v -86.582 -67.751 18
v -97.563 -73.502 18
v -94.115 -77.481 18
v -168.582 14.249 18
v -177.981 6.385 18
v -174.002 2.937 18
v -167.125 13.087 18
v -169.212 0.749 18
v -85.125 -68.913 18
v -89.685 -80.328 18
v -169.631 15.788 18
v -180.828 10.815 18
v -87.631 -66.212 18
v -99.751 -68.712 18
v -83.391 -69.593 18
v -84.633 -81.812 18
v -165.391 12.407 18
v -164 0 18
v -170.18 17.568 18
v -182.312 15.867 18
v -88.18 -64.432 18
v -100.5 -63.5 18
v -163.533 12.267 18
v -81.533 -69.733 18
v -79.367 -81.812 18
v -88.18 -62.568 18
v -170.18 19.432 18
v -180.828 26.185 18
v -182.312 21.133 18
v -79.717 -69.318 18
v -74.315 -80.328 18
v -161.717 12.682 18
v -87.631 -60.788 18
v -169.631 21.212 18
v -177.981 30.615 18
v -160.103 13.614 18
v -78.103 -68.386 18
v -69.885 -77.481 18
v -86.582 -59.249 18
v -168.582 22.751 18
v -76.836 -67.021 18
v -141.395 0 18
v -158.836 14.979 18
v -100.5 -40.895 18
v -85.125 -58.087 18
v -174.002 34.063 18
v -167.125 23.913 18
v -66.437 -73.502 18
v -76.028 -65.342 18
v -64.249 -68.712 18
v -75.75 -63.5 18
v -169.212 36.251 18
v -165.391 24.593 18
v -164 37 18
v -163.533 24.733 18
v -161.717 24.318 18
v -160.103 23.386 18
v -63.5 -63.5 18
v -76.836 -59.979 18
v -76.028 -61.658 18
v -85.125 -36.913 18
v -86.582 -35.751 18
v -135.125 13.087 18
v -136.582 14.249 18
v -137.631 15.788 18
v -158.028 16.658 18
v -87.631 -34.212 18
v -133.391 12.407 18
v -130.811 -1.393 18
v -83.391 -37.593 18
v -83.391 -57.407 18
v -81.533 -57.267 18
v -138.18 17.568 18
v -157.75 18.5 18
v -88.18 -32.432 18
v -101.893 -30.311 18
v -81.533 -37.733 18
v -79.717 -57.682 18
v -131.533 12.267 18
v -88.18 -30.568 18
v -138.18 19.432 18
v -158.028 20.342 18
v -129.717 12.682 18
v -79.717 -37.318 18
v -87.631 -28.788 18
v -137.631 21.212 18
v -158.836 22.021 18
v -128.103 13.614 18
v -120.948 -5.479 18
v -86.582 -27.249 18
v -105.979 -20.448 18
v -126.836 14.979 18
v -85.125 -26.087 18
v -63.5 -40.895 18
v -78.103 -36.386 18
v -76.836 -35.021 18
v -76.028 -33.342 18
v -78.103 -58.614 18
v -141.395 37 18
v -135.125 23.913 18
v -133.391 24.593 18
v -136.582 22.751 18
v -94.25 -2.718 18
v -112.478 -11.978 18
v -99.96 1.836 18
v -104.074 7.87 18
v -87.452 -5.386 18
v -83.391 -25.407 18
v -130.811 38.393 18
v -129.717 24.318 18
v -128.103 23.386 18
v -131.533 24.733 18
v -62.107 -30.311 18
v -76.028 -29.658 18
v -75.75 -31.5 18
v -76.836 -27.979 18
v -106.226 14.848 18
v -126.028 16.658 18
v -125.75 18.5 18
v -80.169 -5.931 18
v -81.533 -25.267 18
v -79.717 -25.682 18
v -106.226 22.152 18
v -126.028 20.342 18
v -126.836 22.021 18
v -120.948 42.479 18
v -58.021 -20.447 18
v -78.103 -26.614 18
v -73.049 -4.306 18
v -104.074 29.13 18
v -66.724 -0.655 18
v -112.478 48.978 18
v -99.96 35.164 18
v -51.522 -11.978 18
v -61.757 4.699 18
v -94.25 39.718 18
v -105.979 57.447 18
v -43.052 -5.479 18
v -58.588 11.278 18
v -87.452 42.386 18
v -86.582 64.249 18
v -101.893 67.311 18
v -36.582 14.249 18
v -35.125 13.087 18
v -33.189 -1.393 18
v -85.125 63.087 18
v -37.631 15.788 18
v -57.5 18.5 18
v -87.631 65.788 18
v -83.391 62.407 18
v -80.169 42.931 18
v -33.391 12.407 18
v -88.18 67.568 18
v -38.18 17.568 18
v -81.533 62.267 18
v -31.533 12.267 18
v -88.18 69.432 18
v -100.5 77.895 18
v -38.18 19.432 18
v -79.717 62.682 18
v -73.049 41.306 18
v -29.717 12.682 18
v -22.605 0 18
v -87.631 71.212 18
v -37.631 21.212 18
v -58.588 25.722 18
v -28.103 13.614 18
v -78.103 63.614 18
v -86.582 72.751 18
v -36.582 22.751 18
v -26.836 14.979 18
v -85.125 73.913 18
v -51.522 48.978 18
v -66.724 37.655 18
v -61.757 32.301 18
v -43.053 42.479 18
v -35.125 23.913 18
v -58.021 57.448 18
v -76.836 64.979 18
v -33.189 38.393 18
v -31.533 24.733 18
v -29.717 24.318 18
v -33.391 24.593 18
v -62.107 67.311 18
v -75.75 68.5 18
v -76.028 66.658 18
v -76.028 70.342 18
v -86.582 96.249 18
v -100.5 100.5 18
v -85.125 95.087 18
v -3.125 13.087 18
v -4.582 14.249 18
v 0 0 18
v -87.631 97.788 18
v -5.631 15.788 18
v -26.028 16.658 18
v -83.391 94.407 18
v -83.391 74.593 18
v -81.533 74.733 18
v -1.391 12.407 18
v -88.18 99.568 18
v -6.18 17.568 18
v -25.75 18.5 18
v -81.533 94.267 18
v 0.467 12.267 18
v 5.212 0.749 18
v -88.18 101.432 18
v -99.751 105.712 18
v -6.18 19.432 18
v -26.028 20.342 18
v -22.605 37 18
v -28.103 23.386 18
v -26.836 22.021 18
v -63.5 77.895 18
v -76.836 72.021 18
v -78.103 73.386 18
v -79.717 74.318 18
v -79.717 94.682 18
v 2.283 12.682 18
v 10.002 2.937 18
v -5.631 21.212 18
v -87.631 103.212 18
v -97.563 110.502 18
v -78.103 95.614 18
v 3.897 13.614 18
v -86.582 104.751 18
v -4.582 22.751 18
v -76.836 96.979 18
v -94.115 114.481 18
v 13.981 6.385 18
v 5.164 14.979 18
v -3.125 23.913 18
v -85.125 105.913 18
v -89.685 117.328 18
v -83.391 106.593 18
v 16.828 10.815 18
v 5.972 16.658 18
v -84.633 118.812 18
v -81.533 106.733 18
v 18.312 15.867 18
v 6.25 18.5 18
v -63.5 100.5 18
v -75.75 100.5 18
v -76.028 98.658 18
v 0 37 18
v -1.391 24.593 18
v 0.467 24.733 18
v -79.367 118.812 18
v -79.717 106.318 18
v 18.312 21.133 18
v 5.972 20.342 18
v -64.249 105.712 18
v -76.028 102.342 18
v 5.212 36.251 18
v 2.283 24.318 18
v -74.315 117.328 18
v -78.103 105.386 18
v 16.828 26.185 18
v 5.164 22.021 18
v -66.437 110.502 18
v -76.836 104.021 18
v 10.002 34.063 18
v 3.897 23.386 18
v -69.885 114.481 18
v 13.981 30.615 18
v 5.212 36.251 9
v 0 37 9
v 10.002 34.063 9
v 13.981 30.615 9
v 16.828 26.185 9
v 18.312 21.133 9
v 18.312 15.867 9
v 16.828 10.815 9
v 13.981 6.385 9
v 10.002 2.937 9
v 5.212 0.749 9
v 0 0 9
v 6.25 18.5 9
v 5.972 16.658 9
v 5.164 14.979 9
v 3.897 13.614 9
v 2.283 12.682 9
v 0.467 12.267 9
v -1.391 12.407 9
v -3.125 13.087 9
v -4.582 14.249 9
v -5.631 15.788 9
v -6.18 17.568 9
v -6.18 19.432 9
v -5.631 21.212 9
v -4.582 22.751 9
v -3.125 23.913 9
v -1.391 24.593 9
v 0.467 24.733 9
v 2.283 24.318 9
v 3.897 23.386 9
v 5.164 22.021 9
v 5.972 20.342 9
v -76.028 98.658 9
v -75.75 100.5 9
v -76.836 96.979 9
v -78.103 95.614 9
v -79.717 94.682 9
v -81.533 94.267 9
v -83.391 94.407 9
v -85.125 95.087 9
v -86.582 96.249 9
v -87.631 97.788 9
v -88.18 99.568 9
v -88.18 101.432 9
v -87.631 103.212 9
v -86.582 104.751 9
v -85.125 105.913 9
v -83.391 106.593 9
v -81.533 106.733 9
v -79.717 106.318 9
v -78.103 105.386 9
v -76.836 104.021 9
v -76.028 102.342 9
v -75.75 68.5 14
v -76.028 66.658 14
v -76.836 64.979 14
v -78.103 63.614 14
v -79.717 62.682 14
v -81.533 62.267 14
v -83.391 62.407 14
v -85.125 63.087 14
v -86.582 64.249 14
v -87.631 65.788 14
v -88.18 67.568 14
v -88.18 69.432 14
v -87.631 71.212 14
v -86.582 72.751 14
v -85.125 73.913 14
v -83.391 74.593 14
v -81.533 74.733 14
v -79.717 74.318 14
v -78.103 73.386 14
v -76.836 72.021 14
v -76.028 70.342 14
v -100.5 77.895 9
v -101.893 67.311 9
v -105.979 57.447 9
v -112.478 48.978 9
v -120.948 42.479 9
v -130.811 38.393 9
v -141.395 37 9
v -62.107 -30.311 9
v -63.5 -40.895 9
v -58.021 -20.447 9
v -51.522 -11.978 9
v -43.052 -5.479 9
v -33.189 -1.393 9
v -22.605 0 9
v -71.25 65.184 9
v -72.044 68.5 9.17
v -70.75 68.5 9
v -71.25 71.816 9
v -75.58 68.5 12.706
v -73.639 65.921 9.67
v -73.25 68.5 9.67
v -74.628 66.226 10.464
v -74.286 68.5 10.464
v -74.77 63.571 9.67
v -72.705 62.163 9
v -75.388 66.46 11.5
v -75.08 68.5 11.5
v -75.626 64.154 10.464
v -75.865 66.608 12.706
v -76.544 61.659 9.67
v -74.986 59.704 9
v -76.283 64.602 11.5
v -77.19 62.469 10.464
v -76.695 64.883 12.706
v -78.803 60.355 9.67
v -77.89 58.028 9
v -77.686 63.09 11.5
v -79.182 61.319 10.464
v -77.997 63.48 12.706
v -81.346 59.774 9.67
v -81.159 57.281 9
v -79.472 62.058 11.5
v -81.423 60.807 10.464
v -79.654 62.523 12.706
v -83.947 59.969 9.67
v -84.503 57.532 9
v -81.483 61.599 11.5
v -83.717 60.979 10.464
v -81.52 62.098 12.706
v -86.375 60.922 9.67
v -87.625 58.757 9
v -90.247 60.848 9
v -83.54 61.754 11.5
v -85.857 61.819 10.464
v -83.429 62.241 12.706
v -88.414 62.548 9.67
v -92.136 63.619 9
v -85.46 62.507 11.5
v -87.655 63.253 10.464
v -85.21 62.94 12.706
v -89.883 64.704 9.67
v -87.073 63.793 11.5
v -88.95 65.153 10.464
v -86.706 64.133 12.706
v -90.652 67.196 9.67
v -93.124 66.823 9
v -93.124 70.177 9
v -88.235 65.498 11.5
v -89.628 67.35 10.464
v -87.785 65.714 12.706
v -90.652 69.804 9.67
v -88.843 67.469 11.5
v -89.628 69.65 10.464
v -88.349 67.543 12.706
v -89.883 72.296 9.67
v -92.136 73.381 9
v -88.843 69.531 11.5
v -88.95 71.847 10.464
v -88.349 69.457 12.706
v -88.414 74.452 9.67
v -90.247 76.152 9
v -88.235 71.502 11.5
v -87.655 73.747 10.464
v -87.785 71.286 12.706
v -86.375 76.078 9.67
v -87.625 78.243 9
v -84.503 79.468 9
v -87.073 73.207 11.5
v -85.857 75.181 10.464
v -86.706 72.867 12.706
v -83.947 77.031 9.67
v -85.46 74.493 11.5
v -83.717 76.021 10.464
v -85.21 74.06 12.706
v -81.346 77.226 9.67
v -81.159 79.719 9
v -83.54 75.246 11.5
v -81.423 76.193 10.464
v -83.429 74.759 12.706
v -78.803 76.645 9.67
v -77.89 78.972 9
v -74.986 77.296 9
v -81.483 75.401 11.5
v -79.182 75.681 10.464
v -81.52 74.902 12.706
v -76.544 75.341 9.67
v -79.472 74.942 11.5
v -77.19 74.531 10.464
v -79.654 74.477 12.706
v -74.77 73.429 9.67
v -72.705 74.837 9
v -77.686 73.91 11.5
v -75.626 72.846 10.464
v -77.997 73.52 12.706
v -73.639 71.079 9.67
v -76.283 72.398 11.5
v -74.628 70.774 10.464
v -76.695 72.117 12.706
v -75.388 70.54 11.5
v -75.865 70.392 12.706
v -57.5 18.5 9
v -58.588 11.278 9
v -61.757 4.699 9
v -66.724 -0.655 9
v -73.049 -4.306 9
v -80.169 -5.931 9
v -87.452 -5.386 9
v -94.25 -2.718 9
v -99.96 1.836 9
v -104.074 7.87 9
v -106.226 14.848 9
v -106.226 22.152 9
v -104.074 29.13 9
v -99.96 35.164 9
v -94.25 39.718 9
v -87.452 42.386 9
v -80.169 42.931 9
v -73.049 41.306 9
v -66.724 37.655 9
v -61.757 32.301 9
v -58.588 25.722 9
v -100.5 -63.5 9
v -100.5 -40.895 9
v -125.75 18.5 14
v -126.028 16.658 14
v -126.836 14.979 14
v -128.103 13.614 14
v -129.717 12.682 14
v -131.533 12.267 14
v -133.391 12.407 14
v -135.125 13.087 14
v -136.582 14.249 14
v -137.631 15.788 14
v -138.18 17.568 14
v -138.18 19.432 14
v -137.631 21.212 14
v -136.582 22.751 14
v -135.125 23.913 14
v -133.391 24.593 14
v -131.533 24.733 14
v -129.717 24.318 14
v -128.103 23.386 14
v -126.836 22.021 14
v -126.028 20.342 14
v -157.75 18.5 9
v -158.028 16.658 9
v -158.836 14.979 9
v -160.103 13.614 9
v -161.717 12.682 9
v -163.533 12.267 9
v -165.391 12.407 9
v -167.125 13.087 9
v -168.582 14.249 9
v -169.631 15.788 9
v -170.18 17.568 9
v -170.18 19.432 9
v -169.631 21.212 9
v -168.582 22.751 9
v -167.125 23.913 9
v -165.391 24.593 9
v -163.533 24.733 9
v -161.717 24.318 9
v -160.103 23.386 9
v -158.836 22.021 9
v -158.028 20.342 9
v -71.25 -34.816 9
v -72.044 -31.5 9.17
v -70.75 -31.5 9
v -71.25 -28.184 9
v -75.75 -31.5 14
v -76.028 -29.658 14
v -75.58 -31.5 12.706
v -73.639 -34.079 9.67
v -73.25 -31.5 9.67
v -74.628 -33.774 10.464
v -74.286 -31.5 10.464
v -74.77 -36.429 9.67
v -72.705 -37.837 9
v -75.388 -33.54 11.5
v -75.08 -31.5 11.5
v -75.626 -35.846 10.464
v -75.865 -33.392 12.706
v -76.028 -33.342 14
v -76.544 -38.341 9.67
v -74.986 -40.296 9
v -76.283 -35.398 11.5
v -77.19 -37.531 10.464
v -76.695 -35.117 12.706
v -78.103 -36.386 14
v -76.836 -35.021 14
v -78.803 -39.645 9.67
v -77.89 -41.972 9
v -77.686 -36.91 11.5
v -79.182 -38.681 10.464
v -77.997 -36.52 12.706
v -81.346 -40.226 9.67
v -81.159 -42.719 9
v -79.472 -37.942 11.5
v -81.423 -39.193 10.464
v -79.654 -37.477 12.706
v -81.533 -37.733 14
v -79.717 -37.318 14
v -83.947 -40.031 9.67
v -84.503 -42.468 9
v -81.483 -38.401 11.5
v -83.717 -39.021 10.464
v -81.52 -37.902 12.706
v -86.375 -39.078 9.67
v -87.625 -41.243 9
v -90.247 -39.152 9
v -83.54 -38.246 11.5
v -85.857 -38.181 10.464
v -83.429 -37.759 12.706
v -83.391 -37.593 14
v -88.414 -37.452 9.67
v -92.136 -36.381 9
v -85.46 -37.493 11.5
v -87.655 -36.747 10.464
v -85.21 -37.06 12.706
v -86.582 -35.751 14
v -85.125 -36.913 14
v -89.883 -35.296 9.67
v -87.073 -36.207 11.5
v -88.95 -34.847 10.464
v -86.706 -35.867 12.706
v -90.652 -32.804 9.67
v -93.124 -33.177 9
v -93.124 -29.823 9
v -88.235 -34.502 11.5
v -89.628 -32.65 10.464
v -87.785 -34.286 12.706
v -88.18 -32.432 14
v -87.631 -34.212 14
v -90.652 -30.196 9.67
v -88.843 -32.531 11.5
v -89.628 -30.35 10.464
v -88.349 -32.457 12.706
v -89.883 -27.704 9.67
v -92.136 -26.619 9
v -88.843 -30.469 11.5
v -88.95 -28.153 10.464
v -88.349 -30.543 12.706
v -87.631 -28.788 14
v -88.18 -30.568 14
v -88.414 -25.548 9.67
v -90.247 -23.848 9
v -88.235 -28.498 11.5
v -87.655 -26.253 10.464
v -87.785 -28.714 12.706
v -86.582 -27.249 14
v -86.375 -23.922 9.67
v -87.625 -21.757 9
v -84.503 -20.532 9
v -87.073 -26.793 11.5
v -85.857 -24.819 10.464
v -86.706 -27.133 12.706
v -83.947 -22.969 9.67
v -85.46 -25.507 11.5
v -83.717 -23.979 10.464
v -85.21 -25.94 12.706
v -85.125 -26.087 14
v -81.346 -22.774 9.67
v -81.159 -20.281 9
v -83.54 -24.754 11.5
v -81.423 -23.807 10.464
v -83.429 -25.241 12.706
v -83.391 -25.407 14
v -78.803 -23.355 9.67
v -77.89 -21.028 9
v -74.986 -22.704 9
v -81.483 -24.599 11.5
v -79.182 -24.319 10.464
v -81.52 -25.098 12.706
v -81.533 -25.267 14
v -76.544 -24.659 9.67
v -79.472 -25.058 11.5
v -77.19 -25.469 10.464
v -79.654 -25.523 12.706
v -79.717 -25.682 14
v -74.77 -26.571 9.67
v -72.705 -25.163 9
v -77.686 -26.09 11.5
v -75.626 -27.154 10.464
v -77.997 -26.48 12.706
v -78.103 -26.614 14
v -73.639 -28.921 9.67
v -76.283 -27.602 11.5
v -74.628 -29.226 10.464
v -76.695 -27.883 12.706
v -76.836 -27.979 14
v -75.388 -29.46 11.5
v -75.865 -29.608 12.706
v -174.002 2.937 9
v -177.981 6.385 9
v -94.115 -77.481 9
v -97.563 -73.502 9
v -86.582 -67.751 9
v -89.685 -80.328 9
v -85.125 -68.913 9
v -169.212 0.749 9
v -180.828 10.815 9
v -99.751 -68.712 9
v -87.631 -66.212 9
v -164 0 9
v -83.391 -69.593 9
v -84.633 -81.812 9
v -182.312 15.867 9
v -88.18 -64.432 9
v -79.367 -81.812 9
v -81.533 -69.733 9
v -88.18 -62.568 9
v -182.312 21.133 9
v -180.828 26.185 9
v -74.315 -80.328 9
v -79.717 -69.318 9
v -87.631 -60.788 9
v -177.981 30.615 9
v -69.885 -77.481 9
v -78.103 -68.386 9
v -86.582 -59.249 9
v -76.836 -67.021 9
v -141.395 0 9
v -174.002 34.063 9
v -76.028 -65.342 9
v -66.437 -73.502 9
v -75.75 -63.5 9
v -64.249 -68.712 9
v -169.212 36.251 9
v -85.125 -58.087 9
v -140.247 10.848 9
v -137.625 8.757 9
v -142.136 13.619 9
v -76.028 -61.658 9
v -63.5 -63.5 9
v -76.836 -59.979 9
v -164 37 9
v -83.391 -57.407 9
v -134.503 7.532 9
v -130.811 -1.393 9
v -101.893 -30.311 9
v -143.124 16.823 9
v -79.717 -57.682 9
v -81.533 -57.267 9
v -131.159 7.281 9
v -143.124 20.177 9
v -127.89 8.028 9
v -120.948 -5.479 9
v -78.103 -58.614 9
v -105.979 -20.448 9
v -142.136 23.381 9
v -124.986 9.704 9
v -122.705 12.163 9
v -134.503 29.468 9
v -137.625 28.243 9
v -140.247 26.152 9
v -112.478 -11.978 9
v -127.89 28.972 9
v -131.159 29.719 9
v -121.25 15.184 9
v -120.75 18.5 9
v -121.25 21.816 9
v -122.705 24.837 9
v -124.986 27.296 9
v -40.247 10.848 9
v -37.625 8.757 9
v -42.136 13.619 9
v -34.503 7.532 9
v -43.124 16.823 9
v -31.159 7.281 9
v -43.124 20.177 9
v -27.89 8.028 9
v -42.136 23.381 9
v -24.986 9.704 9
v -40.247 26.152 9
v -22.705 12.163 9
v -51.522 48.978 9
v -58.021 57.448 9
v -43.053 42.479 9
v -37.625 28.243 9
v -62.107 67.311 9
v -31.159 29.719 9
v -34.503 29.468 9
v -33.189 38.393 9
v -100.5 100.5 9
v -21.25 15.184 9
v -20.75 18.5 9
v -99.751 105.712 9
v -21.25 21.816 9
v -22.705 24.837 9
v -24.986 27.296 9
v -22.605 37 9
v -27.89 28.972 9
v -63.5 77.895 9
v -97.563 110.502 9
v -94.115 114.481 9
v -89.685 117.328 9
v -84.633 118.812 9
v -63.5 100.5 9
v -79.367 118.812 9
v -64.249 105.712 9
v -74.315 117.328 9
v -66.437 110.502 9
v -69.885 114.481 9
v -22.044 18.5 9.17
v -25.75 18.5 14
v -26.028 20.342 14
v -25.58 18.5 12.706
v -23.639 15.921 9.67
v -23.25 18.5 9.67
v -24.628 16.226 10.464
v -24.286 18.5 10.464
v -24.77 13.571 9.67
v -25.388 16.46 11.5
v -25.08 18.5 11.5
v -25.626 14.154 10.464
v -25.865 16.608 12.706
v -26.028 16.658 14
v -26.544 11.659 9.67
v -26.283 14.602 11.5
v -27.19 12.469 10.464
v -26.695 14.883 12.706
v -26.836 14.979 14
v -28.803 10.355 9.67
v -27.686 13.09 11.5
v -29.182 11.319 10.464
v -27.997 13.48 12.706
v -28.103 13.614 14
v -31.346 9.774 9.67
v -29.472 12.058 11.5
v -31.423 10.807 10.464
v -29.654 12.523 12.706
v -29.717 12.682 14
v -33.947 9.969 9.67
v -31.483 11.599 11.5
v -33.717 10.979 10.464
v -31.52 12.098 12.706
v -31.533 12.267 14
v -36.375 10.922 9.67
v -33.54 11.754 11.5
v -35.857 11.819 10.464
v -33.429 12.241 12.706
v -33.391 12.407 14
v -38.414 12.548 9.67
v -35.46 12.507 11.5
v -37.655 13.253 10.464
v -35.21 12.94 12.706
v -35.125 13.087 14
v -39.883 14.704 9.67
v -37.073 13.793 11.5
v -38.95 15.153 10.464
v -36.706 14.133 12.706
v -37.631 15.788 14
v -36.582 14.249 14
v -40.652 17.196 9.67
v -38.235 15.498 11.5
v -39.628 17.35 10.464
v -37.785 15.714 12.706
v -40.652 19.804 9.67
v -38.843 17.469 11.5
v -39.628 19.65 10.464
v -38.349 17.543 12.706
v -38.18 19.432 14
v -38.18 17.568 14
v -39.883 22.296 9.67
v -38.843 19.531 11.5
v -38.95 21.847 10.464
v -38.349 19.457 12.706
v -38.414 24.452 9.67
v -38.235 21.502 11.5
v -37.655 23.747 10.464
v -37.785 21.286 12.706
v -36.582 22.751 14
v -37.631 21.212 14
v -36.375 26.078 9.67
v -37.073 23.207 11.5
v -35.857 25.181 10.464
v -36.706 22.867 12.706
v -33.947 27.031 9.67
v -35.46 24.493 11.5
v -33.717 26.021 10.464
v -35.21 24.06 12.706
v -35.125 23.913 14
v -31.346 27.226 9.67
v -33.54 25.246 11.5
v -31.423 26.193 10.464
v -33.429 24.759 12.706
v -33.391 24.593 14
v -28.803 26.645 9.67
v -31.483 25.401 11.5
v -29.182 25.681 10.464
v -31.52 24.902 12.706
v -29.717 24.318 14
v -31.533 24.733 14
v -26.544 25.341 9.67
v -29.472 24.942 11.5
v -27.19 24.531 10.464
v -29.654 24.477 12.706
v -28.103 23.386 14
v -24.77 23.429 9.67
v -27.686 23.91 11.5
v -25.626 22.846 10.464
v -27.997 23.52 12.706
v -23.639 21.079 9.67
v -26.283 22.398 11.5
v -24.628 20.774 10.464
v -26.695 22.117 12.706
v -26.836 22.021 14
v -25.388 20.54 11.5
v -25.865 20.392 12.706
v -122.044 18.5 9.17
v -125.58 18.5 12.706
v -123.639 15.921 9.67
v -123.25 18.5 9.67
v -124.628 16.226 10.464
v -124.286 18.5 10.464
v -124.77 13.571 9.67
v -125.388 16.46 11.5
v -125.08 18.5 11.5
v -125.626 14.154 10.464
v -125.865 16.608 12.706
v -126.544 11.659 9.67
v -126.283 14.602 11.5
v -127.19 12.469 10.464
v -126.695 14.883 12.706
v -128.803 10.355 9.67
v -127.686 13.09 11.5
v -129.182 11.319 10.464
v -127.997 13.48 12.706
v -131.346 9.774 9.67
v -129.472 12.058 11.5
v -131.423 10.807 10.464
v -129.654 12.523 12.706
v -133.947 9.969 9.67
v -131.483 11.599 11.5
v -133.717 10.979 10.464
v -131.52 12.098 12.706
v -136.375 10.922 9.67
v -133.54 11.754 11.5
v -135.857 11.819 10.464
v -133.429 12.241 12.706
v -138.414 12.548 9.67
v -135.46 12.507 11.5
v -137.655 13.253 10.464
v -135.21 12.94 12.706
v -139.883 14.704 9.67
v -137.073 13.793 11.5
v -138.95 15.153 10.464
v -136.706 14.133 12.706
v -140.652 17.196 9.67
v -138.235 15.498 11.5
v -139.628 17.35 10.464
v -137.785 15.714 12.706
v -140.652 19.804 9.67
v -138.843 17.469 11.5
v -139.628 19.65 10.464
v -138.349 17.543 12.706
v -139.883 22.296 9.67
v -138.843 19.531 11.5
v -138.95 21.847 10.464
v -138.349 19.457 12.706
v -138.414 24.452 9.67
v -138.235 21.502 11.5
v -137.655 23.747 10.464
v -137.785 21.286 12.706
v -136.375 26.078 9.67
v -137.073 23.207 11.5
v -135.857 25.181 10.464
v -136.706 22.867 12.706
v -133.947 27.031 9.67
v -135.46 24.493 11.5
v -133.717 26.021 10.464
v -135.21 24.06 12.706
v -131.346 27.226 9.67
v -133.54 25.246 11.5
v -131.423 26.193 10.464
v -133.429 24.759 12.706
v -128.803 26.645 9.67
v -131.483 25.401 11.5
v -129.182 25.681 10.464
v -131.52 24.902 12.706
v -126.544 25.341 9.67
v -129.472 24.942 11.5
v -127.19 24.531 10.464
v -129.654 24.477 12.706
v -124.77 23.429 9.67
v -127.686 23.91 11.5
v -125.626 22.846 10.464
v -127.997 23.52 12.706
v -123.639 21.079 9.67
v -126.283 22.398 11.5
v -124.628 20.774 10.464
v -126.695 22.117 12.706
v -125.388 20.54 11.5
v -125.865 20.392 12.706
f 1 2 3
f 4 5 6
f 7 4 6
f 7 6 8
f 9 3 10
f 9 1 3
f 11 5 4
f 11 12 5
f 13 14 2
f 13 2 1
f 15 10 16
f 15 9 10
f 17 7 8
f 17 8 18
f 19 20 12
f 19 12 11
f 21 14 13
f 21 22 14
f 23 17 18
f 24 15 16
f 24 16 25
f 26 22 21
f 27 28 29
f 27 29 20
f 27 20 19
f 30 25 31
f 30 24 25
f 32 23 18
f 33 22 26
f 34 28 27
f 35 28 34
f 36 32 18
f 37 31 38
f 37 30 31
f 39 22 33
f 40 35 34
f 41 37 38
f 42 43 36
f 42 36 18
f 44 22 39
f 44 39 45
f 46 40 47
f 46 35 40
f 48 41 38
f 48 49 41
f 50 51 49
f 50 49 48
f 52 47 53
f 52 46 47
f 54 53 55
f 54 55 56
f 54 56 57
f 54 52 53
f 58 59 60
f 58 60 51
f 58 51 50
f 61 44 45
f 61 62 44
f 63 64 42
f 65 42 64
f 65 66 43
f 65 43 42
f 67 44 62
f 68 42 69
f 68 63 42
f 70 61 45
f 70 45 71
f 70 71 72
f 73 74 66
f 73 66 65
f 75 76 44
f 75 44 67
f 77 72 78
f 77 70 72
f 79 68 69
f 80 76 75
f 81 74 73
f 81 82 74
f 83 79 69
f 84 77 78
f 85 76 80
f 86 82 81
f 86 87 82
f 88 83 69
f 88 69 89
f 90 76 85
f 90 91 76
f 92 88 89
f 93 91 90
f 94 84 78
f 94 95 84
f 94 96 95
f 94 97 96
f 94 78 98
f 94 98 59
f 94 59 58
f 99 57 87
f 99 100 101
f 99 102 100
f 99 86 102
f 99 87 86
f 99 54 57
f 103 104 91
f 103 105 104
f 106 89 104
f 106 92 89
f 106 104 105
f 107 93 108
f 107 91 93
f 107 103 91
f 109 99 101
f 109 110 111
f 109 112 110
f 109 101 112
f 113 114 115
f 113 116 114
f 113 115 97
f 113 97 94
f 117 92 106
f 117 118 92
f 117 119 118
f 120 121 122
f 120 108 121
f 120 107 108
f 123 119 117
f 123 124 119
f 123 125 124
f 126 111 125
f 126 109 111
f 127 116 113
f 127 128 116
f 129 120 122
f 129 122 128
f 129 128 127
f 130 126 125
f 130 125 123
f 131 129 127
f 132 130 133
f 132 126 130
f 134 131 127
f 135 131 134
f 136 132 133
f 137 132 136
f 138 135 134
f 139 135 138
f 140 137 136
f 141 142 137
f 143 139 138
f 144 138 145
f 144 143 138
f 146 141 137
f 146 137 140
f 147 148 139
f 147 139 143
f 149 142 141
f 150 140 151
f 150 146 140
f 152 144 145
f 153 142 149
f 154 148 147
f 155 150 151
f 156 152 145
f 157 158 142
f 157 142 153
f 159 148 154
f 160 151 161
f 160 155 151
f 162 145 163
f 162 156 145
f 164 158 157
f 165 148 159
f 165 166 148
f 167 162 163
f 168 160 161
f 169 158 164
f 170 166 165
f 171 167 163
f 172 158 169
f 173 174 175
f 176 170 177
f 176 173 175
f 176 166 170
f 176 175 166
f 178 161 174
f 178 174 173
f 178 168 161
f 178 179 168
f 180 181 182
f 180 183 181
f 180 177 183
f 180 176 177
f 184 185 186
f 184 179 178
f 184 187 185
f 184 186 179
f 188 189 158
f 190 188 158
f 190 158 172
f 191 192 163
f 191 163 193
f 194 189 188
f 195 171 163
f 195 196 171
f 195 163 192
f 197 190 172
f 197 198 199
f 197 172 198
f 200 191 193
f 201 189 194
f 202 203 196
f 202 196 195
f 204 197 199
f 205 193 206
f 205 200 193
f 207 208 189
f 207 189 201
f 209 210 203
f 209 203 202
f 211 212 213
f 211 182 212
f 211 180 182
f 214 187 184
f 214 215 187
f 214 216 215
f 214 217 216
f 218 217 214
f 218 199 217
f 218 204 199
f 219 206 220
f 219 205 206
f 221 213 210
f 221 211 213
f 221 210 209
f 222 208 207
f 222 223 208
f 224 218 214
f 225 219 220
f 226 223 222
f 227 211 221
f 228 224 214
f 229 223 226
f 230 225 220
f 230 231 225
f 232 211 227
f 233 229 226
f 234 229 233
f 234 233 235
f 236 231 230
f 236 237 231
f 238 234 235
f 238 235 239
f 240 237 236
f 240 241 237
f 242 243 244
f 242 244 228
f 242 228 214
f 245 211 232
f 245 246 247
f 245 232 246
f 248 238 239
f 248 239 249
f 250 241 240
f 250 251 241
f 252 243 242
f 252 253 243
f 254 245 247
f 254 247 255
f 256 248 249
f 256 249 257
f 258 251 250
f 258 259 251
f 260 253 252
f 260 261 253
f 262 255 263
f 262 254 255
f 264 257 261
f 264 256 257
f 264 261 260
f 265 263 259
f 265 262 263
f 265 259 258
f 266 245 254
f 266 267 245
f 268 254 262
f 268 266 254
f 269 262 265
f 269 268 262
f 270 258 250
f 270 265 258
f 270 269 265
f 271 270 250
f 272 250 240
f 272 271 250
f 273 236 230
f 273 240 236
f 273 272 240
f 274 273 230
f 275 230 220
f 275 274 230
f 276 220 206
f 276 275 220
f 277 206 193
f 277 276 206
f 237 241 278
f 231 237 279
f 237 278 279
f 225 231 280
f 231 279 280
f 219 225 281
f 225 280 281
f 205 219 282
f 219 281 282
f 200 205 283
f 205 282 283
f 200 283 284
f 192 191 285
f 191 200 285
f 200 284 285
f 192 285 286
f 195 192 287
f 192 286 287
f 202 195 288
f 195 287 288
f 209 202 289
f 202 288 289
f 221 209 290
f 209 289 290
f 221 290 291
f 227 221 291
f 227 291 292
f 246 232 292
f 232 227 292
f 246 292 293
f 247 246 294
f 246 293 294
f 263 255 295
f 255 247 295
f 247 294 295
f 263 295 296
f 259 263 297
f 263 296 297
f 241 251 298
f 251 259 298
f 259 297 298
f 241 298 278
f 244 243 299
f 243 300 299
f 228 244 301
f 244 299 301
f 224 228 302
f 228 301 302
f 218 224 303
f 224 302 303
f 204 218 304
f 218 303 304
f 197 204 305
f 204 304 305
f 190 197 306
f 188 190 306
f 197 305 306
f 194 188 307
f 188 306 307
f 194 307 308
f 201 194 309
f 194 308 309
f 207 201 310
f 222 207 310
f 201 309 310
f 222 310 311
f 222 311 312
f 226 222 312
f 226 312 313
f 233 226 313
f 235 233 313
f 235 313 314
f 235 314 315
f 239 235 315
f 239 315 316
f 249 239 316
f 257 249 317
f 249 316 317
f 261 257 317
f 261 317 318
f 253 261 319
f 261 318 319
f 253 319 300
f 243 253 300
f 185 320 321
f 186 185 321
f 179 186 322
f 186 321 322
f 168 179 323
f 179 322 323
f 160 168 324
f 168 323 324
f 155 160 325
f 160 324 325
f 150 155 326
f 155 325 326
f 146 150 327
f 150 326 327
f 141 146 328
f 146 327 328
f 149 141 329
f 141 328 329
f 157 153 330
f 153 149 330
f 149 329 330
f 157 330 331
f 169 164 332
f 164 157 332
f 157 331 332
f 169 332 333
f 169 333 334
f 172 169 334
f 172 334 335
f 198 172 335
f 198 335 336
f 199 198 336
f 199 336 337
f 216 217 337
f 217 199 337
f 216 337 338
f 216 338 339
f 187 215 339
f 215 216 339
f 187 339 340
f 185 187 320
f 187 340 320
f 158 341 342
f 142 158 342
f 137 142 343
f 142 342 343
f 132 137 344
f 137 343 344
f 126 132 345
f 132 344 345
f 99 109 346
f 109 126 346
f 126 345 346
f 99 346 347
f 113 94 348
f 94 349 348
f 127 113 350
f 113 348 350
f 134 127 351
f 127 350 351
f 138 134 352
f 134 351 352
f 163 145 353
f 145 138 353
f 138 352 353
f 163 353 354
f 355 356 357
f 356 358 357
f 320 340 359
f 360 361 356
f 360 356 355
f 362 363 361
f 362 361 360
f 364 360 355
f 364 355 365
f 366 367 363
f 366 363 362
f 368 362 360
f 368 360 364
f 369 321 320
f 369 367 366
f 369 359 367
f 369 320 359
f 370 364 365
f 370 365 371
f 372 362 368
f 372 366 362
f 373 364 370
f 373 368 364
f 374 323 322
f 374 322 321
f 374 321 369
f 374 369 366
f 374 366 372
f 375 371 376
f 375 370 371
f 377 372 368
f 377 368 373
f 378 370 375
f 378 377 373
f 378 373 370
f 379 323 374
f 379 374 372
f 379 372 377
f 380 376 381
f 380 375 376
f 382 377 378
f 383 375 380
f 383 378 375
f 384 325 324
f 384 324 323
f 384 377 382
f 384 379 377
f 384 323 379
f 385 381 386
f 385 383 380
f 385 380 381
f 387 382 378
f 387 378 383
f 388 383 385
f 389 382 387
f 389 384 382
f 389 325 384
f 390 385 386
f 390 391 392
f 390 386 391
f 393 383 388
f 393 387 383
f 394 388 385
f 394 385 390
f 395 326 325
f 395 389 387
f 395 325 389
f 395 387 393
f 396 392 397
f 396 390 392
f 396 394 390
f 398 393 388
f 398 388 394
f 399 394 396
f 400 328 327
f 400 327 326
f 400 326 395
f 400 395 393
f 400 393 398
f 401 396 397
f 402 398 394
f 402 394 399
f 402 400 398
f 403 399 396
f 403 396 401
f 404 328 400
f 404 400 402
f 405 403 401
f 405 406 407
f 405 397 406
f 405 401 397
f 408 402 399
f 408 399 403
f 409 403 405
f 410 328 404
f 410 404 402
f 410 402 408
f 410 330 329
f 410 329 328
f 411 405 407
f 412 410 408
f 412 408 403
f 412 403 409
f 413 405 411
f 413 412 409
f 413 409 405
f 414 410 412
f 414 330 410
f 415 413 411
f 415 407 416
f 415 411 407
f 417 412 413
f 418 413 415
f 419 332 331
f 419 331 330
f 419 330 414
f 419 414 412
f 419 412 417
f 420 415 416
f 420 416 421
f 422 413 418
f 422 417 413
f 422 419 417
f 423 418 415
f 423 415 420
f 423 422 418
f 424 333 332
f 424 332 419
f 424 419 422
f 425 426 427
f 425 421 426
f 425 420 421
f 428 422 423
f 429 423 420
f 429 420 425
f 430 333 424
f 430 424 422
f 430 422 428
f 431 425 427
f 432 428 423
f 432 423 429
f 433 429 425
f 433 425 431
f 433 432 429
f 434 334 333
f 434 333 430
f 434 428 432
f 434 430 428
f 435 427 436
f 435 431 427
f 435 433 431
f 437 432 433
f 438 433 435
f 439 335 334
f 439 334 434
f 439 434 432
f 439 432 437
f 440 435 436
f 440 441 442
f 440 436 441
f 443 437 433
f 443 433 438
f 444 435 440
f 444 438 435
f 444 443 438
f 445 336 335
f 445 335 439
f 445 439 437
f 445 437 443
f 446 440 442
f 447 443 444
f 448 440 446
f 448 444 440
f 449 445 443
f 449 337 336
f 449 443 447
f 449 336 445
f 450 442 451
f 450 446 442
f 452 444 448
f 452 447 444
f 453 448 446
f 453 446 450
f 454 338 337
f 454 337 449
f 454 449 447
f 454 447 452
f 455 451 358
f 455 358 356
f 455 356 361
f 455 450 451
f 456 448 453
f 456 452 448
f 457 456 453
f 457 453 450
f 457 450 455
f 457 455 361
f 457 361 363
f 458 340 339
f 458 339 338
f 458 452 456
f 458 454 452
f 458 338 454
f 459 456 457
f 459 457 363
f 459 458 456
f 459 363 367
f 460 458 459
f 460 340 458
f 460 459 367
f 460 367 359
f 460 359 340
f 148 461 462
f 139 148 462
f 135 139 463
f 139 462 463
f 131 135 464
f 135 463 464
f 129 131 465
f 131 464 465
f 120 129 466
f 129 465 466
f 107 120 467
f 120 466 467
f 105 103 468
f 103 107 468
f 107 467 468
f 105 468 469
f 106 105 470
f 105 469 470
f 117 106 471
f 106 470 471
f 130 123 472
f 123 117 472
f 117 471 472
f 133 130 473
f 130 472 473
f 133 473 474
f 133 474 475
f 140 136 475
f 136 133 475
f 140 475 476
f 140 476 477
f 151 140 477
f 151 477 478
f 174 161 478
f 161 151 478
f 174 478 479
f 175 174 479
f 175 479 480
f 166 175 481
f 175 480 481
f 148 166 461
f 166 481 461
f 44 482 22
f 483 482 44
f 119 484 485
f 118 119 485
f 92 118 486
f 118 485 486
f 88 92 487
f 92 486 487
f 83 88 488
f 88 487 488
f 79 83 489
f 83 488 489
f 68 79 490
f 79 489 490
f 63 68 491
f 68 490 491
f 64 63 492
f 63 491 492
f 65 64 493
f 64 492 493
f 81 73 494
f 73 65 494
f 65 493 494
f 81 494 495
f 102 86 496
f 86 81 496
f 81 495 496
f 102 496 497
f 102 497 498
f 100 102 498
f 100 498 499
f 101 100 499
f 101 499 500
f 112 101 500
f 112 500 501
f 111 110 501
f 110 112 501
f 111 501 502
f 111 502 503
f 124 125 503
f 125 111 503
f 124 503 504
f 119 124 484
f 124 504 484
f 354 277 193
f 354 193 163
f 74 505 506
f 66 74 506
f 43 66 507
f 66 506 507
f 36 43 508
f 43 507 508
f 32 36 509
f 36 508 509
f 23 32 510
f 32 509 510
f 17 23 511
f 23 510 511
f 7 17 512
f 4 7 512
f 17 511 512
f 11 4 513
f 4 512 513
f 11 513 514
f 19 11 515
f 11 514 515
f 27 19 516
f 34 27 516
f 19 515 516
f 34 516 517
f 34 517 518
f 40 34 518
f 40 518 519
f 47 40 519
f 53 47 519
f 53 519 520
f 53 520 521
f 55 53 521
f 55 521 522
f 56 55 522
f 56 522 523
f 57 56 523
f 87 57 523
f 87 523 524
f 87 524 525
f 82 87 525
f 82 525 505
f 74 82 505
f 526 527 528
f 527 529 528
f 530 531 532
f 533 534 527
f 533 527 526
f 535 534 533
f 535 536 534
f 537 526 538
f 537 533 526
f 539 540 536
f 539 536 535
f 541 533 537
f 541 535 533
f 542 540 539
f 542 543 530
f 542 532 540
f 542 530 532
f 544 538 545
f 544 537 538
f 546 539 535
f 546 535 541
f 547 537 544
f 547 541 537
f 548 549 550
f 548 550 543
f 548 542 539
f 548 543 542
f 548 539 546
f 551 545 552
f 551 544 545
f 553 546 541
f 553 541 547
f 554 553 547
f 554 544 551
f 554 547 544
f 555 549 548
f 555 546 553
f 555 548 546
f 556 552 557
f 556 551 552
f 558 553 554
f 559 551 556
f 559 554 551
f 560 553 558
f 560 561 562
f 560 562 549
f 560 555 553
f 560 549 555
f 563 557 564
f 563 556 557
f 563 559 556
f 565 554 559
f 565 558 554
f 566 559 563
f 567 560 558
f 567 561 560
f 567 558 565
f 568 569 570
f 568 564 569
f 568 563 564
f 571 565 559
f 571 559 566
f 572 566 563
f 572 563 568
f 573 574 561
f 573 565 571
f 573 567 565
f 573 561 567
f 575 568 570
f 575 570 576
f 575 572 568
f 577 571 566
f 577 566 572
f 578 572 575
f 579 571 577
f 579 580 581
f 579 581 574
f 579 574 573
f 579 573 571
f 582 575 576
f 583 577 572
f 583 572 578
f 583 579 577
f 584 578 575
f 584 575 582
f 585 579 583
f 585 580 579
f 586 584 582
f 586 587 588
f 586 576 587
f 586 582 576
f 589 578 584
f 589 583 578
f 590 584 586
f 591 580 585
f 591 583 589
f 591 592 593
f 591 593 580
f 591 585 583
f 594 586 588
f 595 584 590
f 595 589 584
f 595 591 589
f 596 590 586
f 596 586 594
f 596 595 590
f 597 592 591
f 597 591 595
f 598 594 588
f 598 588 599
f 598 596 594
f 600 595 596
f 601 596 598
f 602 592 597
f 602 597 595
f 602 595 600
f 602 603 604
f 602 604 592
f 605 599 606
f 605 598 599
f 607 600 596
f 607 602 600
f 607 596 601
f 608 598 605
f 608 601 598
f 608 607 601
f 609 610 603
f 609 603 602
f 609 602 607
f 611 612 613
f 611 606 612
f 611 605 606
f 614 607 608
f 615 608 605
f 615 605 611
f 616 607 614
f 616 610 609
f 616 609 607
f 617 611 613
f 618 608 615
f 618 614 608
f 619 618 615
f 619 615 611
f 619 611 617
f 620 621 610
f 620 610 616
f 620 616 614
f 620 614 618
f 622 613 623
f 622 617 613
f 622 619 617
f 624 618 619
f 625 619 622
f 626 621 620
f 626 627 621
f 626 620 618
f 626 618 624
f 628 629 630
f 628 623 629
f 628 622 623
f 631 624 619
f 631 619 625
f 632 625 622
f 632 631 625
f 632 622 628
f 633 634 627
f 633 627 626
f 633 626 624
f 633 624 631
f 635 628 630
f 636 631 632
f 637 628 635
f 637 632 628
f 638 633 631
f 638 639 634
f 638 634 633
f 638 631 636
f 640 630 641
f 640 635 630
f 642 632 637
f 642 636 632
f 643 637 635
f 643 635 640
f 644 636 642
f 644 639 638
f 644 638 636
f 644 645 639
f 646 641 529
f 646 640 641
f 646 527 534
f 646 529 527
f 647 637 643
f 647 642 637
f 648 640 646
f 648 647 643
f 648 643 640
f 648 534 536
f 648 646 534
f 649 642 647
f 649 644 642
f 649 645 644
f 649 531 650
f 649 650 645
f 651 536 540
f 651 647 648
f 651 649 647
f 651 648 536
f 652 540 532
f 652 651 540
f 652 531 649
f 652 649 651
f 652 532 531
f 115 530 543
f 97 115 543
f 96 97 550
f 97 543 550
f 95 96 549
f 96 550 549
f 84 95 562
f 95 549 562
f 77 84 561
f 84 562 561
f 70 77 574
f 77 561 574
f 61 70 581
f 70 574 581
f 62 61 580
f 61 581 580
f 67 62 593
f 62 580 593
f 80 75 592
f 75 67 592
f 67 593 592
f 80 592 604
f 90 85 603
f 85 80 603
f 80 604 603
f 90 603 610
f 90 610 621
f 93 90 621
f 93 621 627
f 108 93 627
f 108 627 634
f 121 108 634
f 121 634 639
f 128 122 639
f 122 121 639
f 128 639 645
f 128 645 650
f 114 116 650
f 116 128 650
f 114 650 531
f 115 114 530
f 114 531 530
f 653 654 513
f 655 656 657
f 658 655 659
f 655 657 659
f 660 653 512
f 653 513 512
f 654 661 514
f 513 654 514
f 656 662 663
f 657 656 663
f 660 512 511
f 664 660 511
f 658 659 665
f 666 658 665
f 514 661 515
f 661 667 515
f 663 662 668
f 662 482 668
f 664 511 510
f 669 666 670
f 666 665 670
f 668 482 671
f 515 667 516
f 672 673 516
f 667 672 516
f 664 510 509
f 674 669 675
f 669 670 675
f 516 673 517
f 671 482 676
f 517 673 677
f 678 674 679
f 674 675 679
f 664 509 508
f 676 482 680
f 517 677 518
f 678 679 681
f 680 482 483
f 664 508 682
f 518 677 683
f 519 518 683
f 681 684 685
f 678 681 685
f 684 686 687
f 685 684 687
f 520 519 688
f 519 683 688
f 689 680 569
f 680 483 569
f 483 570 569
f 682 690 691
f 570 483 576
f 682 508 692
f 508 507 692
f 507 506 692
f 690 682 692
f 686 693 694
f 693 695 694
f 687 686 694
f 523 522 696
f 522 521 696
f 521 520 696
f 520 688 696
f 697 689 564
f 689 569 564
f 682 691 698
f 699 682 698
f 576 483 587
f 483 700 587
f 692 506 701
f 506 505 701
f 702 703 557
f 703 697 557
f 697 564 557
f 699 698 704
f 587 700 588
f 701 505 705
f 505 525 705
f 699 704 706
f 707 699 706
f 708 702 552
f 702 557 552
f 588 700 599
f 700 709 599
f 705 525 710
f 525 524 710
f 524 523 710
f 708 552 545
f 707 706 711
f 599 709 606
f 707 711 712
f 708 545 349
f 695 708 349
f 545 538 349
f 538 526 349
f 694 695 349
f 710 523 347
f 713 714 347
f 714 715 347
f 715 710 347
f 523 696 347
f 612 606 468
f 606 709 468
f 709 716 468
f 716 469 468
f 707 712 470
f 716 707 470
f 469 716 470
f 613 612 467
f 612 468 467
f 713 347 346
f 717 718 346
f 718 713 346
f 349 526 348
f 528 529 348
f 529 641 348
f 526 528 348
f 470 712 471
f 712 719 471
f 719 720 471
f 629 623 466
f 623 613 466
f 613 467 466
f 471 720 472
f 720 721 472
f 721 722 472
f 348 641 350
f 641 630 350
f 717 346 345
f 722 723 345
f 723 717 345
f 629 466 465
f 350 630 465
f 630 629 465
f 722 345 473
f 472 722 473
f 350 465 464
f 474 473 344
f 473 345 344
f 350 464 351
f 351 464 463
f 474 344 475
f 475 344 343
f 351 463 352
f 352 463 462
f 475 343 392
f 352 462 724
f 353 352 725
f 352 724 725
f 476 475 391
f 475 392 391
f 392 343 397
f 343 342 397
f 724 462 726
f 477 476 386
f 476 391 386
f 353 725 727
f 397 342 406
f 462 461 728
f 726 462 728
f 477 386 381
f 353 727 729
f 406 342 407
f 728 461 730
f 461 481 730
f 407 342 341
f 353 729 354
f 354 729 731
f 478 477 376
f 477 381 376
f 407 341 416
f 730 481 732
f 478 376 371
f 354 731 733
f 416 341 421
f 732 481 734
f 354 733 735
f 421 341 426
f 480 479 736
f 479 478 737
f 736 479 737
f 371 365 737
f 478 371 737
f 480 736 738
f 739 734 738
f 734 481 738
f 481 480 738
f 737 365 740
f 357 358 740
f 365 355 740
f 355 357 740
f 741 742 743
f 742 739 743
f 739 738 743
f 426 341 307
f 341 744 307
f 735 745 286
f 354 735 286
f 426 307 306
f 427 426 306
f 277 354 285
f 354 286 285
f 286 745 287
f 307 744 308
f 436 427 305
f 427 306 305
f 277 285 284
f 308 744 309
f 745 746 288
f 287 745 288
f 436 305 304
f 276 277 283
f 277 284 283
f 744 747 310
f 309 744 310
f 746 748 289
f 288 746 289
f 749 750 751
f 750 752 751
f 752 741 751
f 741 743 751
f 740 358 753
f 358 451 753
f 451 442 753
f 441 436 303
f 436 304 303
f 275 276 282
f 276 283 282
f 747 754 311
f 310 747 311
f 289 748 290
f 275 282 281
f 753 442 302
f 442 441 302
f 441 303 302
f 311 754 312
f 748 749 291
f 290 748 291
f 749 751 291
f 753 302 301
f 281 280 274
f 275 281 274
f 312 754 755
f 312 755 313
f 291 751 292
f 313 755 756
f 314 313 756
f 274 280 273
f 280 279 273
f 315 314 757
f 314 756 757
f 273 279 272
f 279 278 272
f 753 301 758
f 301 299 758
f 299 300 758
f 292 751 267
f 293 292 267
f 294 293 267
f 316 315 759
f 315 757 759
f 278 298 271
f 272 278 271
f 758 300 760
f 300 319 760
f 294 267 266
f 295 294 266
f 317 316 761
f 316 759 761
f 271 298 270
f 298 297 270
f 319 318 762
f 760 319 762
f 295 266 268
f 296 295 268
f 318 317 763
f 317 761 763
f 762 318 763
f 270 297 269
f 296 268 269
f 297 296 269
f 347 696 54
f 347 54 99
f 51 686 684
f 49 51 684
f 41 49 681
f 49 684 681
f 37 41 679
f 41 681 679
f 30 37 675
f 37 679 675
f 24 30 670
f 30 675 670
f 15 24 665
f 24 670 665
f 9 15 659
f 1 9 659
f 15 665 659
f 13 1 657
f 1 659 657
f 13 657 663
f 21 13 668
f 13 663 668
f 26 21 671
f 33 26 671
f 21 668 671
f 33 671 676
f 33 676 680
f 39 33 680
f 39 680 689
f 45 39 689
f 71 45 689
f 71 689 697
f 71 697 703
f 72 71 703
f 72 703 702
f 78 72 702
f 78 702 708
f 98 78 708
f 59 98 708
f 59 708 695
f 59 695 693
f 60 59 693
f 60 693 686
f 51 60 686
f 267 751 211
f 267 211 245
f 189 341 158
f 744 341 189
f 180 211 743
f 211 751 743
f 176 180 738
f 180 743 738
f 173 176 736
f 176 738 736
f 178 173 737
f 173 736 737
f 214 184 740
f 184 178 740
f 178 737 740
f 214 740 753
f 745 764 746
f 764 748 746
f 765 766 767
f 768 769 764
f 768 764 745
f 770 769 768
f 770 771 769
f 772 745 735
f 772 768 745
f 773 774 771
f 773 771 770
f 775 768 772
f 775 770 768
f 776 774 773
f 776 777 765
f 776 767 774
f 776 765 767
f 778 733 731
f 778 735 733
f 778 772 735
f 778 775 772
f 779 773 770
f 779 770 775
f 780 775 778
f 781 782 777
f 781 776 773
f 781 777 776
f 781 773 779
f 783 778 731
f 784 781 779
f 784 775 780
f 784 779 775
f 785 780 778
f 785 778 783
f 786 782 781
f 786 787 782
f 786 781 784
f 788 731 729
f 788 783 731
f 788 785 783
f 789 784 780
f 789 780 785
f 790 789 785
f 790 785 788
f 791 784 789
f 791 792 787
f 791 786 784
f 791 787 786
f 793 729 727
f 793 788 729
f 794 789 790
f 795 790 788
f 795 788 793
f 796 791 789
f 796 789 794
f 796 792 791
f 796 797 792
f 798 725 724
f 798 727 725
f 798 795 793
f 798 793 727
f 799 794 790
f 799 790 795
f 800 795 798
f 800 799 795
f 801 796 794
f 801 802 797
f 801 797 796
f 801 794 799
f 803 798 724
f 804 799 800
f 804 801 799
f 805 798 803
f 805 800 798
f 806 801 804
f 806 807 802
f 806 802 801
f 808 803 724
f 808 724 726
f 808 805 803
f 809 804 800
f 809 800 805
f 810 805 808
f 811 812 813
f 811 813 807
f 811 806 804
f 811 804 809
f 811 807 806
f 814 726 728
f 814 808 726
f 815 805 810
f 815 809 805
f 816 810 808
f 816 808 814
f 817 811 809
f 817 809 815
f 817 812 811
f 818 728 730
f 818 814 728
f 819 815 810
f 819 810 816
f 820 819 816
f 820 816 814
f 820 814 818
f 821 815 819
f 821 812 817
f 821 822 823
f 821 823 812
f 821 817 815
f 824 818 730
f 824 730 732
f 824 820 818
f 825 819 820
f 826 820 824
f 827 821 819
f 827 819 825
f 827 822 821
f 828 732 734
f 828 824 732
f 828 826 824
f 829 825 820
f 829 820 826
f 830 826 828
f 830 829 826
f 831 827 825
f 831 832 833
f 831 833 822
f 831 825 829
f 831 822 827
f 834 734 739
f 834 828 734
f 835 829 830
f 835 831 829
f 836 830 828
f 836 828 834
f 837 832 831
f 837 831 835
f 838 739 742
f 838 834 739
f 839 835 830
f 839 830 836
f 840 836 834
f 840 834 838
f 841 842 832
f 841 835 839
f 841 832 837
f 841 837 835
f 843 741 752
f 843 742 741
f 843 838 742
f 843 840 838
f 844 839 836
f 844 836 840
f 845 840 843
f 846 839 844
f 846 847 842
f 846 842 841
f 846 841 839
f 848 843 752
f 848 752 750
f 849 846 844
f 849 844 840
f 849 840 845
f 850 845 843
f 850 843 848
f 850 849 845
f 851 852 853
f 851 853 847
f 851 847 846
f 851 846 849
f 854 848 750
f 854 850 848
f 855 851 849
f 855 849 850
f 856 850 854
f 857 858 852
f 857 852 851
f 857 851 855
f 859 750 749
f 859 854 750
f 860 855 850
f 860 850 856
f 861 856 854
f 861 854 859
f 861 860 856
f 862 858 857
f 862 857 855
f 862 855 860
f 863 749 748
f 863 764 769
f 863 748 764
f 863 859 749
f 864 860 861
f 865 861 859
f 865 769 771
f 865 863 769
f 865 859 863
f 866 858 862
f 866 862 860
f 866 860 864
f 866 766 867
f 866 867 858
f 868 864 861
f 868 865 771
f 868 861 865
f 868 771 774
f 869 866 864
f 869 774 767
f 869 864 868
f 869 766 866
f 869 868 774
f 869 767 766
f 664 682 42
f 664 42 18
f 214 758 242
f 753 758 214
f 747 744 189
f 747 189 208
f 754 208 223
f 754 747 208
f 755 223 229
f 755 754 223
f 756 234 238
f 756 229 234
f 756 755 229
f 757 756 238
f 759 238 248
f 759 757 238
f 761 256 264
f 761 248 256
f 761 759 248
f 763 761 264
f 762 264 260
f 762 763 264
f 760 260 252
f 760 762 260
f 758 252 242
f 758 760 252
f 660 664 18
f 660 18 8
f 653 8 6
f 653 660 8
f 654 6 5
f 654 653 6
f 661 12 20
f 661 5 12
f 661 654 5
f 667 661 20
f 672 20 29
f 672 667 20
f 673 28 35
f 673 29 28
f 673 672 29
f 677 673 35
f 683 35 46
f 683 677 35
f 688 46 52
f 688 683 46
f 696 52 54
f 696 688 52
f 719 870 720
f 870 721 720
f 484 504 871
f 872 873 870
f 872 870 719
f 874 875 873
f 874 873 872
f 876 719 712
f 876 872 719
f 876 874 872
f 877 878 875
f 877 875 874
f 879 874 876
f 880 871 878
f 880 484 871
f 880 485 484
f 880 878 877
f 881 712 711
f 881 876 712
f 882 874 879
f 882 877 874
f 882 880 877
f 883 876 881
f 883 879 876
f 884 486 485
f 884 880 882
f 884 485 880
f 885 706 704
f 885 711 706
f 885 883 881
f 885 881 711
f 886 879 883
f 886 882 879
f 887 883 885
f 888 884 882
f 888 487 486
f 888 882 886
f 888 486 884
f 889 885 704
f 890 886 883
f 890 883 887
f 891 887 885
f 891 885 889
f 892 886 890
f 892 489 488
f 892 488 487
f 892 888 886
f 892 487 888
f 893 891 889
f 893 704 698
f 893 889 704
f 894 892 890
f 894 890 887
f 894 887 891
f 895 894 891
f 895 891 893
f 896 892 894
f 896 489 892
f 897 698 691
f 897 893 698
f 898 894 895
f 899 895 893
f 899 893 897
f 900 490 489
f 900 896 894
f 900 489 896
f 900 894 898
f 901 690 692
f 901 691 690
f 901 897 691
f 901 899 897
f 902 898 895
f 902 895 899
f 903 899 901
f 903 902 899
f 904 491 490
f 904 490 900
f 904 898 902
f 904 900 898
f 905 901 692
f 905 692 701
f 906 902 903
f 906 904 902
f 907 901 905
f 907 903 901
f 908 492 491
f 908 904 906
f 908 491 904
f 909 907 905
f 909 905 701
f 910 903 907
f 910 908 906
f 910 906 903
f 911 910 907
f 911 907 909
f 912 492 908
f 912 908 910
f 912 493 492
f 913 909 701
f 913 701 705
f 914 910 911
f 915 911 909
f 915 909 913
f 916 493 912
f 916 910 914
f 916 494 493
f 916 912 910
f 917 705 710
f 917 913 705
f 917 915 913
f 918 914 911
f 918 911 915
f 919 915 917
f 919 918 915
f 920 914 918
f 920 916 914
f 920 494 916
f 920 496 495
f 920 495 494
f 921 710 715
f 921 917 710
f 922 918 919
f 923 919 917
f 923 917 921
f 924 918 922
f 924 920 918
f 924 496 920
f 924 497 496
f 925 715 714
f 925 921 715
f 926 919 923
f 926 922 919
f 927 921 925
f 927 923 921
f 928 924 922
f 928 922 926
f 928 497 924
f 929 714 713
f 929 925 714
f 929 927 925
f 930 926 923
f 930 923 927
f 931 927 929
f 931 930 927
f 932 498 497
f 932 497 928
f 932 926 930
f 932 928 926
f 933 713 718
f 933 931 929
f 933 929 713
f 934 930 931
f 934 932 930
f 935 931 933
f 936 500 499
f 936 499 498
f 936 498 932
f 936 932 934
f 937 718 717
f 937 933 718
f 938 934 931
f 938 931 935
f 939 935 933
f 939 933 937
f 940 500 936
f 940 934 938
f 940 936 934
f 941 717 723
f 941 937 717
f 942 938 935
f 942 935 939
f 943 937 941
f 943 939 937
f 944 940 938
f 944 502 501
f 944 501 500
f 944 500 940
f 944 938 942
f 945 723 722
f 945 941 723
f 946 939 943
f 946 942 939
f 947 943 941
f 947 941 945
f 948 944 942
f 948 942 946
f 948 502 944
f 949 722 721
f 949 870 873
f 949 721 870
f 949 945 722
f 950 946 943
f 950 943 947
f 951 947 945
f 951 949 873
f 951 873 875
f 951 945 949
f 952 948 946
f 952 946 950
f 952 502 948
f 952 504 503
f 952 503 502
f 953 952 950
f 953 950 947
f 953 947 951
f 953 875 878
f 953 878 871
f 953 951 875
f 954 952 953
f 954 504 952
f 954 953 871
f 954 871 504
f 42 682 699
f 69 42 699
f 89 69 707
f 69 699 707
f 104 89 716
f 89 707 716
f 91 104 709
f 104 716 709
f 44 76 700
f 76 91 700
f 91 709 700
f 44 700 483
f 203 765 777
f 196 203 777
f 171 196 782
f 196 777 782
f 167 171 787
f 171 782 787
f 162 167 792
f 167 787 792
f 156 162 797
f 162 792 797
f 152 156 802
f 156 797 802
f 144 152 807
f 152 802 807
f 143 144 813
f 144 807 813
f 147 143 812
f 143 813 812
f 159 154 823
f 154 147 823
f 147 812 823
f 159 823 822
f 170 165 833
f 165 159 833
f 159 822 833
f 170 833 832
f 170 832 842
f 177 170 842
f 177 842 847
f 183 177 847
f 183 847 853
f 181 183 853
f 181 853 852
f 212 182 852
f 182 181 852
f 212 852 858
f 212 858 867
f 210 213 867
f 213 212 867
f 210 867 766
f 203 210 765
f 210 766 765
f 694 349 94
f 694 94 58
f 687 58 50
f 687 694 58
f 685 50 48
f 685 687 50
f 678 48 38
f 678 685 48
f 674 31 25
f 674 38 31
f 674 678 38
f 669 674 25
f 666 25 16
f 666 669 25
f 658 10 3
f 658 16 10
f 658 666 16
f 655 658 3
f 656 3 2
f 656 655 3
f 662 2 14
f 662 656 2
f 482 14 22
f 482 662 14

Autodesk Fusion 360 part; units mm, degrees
sketch "Sketch1" plane through (0, 0, 0) normal (0, 0, 1) x (1, 0, 0)
  circle A0 centre (0, 0) radius 164
  line L0 (0, 220) -> (0, -226.5969) construction
  line L1 (-260, 0) -> (224.3647, 0) construction
  circle A1 centre (0, 164) radius 12.5
  line L2 (37, 164) -> (37, 118.79)
  line L3 (-37, 118.79) -> (-37, 164)
  arc A2 (37, 164) -> (-37, 164) centre (0, 164) ccw
  arc A3 (-164, 37) -> (-164, -37) centre (-164, 0) ccw
  circle A4 centre (-164, 0) radius 12.5
  line L4 (-118.79, -37) -> (-164, -37)
  line L5 (-164, 37) -> (-118.79, 37)
  arc A5 (-37, -164) -> (37, -164) centre (0, -164) ccw
  circle A6 centre (0, -164) radius 12.5
  line L6 (37, -118.79) -> (37, -164)
  line L7 (-37, -164) -> (-37, -118.79)
  arc A7 (164, -37) -> (164, 37) centre (164, 0) ccw
  circle A8 centre (164, 0) radius 12.5
  line L8 (118.79, 37) -> (164, 37)
  line L9 (164, -37) -> (118.79, -37)
  arc A9 (37, 118.79) -> (118.79, 37) centre (118.79, 118.79) ccw
  arc A10 (118.79, -37) -> (37, -118.79) centre (118.79, -118.79) ccw
  arc A11 (-37, -118.79) -> (-118.79, -37) centre (-118.79, -118.79) ccw
  arc A12 (-118.79, 37) -> (-37, 118.79) centre (-118.79, 118.79) ccw
  circle A13 centre (100, 0) radius 12.5
  circle A14 centre (0, 100) radius 12.5
  circle A15 centre (-100, 0) radius 12.5
  circle A16 centre (0, -100) radius 12.5
  circle A17 centre (0, 0) radius 49
  dimension "d1" = 328
  dimension "d3" = 74
  dimension "d4" = 25
  dimension "d7" = 45.21
  dimension "d8" = 45.21
  dimension "d10" = 360
  dimension "d11" = 25
  dimension "d12" = 100
  dimension "d14" = 360
  dimension "d15" = 98
extrude "Extrude1" add sketch "Sketch1" along normal blind 18 contours A0 A1 L2 L3 A4 L4 L5 A6 L6 L7 A8 L8 L9 A9 A10 A11 A12 | A0 A7 A8 L8 L9 | A0 A1 L2 L3 A2 | A0 A5 A6 L6 L7 | A0 A3 A4 L4 L5
fillet "Fillet2" radius 10 4 edges at (-111.6541, 4.5202, 0) (-11.6541, -95.4798, 0) (88.3459, 4.5202, 0) (-11.6541, 104.5202, 0)
scale "Scale1" factor 0.5 about (-164, 37, 18) bodies 1
equation "d3 = ( 37 * 2 ) * 1 mm"
